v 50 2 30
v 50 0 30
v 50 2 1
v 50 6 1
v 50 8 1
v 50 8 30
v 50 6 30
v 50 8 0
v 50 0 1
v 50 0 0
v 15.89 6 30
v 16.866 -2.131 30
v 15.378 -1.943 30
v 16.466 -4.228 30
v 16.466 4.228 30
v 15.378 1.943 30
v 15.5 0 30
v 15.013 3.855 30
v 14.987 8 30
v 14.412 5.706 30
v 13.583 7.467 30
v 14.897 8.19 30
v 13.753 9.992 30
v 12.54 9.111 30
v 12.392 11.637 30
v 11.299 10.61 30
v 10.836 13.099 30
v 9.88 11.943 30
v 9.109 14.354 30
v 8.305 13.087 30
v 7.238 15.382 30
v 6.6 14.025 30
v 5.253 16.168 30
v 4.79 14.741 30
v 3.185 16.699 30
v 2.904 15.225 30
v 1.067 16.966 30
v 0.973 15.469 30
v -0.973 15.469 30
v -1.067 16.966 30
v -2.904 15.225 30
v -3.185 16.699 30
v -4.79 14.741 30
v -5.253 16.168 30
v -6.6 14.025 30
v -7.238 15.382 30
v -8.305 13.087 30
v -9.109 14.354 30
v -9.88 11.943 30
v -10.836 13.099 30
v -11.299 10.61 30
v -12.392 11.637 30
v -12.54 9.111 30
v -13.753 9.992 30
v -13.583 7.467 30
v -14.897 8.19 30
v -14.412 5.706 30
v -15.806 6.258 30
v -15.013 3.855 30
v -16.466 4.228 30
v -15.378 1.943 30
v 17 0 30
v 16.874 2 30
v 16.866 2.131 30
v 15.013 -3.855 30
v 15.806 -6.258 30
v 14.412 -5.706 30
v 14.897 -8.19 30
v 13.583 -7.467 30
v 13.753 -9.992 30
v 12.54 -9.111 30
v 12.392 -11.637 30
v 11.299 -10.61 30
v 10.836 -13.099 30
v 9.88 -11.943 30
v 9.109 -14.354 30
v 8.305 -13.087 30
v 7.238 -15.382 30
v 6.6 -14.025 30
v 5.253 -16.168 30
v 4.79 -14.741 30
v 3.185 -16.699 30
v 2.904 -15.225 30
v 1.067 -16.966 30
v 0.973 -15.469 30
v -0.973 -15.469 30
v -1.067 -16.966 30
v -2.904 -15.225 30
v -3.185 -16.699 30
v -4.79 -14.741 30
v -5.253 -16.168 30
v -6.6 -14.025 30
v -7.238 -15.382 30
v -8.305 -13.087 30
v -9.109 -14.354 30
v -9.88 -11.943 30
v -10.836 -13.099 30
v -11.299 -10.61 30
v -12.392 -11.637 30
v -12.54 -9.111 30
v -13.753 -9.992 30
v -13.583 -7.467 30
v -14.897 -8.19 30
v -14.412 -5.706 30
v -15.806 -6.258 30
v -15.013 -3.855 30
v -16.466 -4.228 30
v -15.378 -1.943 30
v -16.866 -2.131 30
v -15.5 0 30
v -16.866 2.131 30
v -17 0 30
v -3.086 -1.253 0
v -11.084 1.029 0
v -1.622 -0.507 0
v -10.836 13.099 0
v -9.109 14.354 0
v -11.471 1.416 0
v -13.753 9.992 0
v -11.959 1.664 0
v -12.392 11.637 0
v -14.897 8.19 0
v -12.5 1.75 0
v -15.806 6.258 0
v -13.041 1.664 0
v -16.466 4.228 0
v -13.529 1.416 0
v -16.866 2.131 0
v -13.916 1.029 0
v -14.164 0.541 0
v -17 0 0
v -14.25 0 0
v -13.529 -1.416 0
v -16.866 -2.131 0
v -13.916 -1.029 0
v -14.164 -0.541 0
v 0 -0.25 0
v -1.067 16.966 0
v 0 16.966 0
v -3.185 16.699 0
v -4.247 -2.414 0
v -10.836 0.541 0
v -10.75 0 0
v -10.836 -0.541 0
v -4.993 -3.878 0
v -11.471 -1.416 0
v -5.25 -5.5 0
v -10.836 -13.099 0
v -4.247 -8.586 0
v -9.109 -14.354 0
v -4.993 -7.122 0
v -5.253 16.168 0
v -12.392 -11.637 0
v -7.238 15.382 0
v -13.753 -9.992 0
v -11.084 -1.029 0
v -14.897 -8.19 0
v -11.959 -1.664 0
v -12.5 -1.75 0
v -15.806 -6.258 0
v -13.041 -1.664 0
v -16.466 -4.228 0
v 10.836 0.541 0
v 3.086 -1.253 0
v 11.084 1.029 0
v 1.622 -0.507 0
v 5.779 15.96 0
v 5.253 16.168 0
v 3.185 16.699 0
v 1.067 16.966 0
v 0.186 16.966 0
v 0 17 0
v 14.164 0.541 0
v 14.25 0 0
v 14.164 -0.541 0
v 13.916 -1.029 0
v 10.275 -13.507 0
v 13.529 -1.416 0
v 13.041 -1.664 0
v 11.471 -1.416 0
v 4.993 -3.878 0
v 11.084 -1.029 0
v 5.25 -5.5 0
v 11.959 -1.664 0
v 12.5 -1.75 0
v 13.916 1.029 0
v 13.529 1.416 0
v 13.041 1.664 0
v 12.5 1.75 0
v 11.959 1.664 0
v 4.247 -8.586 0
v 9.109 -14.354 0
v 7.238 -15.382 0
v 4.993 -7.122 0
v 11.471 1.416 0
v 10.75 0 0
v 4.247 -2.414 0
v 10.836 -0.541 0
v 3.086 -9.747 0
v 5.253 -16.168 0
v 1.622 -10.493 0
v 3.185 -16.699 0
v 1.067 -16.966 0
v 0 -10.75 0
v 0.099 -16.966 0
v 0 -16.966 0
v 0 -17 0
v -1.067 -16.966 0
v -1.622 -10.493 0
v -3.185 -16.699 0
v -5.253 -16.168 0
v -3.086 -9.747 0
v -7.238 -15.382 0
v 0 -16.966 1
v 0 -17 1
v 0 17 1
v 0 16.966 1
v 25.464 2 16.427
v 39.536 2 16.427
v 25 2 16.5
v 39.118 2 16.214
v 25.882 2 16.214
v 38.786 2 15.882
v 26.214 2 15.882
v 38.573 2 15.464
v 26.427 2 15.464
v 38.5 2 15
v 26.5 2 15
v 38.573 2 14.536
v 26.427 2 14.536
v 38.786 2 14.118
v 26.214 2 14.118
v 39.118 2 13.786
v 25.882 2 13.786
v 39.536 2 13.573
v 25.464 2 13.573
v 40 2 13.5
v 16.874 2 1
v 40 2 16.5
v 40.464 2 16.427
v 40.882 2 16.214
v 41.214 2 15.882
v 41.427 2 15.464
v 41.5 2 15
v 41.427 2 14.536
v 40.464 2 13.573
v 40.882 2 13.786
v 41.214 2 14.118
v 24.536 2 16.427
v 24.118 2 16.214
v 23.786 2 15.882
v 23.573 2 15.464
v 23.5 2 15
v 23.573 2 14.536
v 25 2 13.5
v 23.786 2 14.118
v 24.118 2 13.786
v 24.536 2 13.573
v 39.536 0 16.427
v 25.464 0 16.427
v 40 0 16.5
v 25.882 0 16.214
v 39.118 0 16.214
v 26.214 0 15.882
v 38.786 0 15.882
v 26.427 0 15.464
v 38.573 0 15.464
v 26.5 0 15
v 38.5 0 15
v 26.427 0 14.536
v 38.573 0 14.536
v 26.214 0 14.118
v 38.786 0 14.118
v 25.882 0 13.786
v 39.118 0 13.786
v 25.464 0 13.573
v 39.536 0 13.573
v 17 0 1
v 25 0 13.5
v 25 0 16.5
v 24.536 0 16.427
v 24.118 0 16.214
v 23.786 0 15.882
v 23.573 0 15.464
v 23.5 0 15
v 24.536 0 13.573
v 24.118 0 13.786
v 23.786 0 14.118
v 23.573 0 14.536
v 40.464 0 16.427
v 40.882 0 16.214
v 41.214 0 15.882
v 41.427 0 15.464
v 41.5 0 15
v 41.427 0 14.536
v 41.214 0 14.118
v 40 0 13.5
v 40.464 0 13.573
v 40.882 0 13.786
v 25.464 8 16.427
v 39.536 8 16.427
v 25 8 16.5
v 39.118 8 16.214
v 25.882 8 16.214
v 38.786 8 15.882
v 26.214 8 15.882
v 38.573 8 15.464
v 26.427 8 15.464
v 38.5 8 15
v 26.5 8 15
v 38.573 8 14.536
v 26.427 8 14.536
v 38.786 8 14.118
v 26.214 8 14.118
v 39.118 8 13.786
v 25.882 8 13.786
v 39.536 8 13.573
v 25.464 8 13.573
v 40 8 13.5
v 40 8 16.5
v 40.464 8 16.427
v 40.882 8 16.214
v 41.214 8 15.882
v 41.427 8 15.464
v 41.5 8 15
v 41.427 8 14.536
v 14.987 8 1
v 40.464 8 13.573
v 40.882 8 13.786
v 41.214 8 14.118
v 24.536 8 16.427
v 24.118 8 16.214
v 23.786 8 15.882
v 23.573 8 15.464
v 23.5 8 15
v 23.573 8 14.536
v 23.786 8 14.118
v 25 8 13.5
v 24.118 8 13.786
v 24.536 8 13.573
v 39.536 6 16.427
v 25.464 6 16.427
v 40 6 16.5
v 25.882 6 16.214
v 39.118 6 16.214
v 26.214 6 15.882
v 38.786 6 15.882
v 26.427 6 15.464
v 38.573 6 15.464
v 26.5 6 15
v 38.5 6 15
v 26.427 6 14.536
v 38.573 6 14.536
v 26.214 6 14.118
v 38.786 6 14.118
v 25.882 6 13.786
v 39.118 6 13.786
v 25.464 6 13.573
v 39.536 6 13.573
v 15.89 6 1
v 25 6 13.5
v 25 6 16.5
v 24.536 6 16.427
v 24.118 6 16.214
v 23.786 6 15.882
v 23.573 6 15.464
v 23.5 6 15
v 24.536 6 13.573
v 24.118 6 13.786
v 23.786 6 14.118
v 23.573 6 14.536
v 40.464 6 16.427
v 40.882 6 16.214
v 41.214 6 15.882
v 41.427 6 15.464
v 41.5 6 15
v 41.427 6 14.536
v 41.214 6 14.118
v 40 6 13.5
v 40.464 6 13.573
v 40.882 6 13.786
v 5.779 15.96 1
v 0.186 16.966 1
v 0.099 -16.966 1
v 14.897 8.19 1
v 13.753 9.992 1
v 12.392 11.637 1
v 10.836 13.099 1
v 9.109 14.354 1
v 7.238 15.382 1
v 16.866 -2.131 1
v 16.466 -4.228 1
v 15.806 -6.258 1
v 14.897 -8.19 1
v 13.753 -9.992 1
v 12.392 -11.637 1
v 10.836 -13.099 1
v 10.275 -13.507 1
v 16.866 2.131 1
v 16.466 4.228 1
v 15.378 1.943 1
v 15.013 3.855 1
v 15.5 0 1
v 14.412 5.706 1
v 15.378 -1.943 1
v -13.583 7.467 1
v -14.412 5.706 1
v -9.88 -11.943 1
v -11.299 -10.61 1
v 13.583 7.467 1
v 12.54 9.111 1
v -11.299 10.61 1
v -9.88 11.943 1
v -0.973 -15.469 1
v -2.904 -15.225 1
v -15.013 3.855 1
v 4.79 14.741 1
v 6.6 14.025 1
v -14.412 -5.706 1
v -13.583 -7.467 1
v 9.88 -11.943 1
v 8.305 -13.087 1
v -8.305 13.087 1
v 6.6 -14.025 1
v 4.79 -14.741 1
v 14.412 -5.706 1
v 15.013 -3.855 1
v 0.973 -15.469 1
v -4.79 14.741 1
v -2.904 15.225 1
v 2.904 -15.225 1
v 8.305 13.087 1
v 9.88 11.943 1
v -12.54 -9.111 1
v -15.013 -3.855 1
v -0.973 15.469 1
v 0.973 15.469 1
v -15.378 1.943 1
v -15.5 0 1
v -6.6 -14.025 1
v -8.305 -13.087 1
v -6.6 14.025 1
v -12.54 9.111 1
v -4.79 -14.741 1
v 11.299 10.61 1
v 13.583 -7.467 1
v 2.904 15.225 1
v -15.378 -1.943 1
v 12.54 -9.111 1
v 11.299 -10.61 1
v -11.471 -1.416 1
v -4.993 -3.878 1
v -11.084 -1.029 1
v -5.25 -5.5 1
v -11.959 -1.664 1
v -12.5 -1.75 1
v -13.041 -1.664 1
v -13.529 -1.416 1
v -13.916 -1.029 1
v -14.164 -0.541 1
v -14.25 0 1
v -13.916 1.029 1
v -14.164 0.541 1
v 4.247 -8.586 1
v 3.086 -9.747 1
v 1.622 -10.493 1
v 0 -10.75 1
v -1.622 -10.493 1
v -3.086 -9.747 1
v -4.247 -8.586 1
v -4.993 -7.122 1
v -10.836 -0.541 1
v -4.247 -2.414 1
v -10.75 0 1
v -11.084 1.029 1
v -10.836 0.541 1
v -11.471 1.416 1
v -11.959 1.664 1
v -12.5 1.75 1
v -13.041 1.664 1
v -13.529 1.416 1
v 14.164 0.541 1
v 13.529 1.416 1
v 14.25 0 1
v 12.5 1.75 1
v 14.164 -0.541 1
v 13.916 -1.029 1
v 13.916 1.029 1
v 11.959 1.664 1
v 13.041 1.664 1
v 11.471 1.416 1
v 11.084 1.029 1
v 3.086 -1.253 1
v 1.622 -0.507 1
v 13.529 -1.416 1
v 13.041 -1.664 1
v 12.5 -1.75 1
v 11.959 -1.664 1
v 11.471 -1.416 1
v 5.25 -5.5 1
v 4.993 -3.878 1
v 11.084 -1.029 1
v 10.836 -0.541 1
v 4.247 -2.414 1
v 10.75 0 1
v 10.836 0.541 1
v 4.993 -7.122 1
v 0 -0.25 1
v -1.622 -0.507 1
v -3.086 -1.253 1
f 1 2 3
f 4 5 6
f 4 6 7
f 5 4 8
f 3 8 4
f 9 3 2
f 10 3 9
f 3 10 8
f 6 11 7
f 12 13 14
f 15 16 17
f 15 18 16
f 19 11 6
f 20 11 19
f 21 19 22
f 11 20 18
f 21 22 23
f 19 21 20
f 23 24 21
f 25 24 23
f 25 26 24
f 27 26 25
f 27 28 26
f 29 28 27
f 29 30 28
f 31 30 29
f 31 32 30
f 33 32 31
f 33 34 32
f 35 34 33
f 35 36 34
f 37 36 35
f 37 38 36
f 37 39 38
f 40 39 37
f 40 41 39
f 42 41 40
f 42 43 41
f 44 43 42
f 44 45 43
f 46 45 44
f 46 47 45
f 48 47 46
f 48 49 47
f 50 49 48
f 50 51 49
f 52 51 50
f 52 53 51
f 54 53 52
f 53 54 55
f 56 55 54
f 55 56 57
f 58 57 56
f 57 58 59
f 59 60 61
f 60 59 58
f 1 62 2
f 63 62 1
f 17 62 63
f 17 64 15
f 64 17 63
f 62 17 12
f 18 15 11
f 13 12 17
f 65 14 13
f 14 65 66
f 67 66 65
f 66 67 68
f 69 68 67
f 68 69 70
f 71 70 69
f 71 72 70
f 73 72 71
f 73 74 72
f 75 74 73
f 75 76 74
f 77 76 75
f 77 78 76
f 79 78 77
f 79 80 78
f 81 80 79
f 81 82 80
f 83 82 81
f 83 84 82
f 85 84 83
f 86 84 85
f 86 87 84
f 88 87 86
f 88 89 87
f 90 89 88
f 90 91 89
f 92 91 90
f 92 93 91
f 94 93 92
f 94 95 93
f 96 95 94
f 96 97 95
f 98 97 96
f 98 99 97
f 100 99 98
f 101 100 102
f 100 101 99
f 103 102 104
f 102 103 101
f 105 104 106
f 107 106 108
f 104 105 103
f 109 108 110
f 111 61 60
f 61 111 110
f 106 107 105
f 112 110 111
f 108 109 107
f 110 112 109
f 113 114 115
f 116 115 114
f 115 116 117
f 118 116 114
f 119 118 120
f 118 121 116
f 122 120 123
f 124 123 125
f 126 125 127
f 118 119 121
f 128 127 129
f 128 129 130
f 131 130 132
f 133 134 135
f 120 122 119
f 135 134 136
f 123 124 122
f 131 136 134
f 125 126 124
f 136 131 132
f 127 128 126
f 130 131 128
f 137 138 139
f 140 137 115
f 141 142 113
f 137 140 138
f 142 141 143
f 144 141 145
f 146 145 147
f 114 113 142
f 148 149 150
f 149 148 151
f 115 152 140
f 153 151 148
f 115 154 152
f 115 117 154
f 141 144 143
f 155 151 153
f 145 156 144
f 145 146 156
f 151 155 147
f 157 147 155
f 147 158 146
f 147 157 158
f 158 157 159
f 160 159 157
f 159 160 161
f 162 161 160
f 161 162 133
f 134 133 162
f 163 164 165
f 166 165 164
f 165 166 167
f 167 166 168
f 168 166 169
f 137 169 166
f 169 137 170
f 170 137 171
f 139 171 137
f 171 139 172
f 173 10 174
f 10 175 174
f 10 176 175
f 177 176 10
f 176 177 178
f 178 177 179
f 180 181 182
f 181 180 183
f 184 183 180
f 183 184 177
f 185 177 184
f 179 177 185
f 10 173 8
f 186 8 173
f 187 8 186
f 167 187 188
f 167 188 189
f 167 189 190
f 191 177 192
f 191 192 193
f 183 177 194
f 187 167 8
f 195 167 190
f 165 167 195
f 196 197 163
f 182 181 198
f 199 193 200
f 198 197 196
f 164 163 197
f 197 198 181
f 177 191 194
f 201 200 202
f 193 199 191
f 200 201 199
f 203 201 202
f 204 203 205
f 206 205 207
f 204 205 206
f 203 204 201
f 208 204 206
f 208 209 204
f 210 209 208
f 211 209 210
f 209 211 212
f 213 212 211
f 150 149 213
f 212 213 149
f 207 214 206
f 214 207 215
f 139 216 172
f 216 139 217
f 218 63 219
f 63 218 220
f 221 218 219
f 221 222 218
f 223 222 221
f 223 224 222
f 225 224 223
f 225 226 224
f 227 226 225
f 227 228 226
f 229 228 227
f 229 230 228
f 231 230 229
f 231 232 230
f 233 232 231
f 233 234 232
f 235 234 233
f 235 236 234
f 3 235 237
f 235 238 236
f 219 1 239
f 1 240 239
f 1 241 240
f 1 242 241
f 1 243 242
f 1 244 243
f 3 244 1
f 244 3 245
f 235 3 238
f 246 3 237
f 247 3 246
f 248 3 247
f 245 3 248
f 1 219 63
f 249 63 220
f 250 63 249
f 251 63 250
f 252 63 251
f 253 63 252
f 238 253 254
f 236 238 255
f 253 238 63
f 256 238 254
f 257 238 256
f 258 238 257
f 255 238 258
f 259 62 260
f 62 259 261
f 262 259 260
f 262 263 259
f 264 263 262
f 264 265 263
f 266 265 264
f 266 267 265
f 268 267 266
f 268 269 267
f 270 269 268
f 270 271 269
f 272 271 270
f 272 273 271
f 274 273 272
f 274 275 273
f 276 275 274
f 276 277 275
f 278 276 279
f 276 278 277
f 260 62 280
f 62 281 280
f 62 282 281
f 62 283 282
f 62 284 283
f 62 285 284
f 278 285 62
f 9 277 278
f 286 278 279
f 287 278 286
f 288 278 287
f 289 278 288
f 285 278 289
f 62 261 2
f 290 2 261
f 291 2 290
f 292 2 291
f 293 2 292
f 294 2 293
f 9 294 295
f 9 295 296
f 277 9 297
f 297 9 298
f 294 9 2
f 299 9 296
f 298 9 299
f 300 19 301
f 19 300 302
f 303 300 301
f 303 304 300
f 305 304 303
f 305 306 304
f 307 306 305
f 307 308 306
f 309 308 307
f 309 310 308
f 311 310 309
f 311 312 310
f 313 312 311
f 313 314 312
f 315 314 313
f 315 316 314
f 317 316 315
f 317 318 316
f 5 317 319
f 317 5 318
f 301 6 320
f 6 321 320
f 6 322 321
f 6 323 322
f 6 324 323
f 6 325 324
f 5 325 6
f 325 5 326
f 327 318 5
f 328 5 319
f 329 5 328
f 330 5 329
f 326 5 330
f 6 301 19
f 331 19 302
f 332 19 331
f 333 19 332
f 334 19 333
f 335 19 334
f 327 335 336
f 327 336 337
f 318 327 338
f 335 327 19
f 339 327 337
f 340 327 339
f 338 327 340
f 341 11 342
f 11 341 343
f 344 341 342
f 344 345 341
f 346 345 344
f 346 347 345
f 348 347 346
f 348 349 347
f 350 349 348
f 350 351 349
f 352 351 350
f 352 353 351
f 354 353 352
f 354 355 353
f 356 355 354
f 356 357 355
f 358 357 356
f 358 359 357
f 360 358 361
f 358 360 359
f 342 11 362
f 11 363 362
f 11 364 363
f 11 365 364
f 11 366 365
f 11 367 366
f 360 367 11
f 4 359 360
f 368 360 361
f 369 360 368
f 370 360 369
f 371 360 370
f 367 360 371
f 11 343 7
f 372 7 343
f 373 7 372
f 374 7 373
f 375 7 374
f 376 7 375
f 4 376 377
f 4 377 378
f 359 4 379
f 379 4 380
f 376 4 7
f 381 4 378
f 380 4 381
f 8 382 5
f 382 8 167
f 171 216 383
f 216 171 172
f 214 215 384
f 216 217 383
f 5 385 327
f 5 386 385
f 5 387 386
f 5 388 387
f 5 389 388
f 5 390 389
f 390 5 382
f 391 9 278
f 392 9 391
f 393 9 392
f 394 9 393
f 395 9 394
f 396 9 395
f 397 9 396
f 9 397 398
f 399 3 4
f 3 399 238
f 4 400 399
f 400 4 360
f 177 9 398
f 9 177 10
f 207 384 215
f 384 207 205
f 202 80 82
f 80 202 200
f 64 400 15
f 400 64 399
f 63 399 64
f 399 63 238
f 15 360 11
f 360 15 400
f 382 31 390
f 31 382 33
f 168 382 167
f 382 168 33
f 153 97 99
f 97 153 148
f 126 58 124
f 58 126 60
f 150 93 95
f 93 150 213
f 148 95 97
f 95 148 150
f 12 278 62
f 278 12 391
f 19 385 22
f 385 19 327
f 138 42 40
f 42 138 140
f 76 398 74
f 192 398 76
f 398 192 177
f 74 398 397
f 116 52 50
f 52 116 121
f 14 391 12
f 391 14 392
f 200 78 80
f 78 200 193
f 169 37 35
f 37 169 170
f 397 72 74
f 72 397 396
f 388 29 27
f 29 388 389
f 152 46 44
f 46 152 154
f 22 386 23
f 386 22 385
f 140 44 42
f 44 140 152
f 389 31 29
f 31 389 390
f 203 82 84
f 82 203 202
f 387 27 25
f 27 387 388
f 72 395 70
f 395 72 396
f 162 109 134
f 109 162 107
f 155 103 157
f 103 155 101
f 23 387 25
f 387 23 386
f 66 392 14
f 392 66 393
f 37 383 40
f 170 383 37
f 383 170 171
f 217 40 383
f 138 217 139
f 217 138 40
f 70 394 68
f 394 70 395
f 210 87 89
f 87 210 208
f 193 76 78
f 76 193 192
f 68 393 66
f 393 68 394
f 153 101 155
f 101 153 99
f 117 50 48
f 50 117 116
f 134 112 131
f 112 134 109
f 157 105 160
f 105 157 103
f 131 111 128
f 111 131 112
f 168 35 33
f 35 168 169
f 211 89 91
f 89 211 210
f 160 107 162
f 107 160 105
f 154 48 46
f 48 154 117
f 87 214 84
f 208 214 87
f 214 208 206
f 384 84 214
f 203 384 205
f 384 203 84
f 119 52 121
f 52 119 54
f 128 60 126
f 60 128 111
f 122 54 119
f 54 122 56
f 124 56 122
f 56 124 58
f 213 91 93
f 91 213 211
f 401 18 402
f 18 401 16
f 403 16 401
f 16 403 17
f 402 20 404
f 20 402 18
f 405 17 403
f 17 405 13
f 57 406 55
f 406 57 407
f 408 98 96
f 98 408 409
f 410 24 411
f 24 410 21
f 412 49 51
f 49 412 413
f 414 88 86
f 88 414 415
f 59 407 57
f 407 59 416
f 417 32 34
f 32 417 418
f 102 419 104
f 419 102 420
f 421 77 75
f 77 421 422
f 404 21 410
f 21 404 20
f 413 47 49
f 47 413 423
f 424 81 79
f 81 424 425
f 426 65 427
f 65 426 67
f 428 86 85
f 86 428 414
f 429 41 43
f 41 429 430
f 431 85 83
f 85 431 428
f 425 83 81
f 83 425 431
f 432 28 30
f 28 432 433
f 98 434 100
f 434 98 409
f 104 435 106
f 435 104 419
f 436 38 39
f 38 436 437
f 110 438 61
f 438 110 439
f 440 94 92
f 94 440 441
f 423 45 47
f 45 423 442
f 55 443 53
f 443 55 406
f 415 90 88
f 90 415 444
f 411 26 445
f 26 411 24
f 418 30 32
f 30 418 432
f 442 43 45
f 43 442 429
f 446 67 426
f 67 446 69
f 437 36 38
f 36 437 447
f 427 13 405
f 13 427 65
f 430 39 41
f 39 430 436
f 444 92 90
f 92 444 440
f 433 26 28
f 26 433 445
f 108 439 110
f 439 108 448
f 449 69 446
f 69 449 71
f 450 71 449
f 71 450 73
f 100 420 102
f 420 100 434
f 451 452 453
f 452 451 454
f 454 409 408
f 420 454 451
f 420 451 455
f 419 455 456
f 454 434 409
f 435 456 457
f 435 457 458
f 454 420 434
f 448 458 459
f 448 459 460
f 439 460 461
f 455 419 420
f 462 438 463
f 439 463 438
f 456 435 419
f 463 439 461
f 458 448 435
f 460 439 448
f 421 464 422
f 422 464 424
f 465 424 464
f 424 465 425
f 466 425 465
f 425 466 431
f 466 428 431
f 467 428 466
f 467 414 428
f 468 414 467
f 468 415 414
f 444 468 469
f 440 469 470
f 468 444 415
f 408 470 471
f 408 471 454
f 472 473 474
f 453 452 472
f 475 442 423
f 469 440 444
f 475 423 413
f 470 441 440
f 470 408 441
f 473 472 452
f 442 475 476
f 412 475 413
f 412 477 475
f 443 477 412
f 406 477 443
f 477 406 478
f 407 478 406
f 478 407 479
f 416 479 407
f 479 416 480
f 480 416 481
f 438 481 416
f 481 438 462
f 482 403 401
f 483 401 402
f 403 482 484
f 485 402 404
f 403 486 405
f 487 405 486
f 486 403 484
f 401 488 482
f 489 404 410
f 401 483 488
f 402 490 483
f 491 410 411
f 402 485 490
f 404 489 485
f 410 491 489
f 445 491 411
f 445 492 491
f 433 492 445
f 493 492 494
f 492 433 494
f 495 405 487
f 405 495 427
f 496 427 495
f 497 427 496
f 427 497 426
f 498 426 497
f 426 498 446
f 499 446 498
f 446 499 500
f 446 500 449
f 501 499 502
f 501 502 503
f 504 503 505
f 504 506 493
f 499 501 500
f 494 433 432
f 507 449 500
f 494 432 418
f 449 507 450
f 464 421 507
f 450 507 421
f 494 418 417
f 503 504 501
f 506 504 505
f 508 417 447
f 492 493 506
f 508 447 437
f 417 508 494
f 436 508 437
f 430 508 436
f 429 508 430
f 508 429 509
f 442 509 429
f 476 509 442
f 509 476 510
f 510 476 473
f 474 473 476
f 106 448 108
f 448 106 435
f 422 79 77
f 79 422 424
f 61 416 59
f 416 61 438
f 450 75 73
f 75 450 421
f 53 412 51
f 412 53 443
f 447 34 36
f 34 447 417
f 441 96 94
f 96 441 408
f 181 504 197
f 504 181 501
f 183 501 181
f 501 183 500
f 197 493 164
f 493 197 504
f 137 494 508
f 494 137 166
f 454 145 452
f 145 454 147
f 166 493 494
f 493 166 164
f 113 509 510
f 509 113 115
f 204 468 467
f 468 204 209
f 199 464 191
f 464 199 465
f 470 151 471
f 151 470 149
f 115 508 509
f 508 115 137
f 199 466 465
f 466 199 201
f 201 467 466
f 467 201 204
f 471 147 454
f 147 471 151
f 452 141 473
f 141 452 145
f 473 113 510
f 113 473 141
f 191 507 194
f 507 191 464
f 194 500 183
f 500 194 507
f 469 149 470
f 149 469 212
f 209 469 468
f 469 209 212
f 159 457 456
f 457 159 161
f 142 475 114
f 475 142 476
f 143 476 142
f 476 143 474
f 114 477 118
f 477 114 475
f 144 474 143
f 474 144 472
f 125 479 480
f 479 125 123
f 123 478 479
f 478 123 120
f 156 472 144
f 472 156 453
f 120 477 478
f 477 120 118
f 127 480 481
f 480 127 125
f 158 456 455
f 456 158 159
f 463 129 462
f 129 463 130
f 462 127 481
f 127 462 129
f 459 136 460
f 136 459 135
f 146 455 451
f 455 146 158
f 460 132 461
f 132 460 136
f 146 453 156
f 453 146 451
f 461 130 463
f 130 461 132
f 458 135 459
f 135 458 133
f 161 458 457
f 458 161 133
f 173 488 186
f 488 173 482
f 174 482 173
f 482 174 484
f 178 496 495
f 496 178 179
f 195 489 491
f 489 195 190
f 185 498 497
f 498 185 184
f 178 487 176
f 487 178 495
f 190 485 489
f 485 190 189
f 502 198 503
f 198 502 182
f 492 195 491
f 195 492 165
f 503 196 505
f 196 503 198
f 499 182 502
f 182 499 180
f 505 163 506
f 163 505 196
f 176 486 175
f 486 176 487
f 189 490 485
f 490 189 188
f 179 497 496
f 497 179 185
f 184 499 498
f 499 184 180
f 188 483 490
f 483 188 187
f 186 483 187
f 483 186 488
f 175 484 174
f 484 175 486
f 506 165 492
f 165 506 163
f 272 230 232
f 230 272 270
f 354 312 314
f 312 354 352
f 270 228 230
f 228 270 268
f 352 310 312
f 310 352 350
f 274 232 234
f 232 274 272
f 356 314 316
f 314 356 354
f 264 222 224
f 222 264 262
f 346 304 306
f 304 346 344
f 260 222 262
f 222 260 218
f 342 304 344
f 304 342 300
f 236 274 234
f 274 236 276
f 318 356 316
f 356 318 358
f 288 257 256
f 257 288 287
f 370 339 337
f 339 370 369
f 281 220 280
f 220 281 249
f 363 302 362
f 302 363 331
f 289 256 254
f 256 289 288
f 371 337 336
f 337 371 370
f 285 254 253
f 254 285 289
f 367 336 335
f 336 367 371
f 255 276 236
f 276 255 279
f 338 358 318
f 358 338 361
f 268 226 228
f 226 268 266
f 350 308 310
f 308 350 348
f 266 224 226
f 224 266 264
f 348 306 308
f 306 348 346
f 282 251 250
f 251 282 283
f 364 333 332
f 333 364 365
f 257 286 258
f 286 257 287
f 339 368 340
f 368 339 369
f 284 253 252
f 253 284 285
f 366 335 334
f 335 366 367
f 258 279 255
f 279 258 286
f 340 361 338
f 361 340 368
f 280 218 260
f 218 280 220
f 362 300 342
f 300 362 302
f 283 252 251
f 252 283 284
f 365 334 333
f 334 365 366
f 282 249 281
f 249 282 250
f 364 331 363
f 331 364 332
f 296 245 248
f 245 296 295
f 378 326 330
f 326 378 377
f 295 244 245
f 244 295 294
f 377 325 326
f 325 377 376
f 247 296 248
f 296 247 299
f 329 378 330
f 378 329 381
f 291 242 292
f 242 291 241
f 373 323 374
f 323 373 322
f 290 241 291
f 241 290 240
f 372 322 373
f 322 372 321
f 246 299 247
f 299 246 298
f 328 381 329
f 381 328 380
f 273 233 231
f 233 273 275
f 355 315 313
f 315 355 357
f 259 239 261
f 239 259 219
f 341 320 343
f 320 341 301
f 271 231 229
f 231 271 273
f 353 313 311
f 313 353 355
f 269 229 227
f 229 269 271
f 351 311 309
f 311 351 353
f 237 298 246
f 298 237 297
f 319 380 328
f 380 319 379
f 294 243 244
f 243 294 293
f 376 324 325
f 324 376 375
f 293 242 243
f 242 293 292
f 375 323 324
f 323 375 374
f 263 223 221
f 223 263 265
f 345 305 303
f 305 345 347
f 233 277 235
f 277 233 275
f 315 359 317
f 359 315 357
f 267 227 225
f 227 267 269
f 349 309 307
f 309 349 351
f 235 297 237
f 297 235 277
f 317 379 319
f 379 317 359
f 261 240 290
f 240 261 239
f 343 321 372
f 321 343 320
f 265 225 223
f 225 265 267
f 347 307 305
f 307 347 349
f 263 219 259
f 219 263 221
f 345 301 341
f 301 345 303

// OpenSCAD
// file: Hexnut.scad
module hexnut(flats=10, depth=5){
	sliceangle = 360 / 6;
	pointradius = flats / (2 * cos(sliceangle/2));
	flatoffset = flats * tan(sliceangle/2) / 2;
	union(){
		for(angle=[0:sliceangle:360]) {
			rotate(angle,[0,0,1]) linear_extrude(height=depth) polygon(points=[[0,-1],[flatoffset,flats/2],[-flatoffset,flats/2]],paths=[[0,1,2]]);
		}
	}
}
// main file
use <Hexnut.scad>

module motor_bracket(){
		union() {
			difference() {
				union() {
					cube([50,2,30]);
					translate([0,6,0])
						cube([50,2,30]);
					linear_extrude(height = 1)
						polygon(points=[[0,-17],[0,17],[50,8],[50,0]], paths=[[0,1,2,3]]);
					translate([0,0,0]) cylinder(r=17,h=30,$fn=50);
				}
				union() {
					translate([0,0,1]) cylinder(r=15.5,h=60,$fn=50);
					translate([0,-5.5,0]) cylinder(r=5.25,h=2,center=true,$fn=20);
					translate([-12.5,0,0]) cylinder(r=1.75,h=2,center=true,$fn=20);
					translate([12.5,0,0]) cylinder(r=1.75,h=2,center=true,$fn=20);
					translate([25,0,15]) rotate(270,[1,0,0]) cylinder(r=1.5,h=10,$fn=20);
					translate([40,0,15]) rotate(270,[1,0,0]) cylinder(r=1.5,h=10,$fn=20);
				}
			}
		}
}

//mirror([0,1,0])
motor_bracket();
